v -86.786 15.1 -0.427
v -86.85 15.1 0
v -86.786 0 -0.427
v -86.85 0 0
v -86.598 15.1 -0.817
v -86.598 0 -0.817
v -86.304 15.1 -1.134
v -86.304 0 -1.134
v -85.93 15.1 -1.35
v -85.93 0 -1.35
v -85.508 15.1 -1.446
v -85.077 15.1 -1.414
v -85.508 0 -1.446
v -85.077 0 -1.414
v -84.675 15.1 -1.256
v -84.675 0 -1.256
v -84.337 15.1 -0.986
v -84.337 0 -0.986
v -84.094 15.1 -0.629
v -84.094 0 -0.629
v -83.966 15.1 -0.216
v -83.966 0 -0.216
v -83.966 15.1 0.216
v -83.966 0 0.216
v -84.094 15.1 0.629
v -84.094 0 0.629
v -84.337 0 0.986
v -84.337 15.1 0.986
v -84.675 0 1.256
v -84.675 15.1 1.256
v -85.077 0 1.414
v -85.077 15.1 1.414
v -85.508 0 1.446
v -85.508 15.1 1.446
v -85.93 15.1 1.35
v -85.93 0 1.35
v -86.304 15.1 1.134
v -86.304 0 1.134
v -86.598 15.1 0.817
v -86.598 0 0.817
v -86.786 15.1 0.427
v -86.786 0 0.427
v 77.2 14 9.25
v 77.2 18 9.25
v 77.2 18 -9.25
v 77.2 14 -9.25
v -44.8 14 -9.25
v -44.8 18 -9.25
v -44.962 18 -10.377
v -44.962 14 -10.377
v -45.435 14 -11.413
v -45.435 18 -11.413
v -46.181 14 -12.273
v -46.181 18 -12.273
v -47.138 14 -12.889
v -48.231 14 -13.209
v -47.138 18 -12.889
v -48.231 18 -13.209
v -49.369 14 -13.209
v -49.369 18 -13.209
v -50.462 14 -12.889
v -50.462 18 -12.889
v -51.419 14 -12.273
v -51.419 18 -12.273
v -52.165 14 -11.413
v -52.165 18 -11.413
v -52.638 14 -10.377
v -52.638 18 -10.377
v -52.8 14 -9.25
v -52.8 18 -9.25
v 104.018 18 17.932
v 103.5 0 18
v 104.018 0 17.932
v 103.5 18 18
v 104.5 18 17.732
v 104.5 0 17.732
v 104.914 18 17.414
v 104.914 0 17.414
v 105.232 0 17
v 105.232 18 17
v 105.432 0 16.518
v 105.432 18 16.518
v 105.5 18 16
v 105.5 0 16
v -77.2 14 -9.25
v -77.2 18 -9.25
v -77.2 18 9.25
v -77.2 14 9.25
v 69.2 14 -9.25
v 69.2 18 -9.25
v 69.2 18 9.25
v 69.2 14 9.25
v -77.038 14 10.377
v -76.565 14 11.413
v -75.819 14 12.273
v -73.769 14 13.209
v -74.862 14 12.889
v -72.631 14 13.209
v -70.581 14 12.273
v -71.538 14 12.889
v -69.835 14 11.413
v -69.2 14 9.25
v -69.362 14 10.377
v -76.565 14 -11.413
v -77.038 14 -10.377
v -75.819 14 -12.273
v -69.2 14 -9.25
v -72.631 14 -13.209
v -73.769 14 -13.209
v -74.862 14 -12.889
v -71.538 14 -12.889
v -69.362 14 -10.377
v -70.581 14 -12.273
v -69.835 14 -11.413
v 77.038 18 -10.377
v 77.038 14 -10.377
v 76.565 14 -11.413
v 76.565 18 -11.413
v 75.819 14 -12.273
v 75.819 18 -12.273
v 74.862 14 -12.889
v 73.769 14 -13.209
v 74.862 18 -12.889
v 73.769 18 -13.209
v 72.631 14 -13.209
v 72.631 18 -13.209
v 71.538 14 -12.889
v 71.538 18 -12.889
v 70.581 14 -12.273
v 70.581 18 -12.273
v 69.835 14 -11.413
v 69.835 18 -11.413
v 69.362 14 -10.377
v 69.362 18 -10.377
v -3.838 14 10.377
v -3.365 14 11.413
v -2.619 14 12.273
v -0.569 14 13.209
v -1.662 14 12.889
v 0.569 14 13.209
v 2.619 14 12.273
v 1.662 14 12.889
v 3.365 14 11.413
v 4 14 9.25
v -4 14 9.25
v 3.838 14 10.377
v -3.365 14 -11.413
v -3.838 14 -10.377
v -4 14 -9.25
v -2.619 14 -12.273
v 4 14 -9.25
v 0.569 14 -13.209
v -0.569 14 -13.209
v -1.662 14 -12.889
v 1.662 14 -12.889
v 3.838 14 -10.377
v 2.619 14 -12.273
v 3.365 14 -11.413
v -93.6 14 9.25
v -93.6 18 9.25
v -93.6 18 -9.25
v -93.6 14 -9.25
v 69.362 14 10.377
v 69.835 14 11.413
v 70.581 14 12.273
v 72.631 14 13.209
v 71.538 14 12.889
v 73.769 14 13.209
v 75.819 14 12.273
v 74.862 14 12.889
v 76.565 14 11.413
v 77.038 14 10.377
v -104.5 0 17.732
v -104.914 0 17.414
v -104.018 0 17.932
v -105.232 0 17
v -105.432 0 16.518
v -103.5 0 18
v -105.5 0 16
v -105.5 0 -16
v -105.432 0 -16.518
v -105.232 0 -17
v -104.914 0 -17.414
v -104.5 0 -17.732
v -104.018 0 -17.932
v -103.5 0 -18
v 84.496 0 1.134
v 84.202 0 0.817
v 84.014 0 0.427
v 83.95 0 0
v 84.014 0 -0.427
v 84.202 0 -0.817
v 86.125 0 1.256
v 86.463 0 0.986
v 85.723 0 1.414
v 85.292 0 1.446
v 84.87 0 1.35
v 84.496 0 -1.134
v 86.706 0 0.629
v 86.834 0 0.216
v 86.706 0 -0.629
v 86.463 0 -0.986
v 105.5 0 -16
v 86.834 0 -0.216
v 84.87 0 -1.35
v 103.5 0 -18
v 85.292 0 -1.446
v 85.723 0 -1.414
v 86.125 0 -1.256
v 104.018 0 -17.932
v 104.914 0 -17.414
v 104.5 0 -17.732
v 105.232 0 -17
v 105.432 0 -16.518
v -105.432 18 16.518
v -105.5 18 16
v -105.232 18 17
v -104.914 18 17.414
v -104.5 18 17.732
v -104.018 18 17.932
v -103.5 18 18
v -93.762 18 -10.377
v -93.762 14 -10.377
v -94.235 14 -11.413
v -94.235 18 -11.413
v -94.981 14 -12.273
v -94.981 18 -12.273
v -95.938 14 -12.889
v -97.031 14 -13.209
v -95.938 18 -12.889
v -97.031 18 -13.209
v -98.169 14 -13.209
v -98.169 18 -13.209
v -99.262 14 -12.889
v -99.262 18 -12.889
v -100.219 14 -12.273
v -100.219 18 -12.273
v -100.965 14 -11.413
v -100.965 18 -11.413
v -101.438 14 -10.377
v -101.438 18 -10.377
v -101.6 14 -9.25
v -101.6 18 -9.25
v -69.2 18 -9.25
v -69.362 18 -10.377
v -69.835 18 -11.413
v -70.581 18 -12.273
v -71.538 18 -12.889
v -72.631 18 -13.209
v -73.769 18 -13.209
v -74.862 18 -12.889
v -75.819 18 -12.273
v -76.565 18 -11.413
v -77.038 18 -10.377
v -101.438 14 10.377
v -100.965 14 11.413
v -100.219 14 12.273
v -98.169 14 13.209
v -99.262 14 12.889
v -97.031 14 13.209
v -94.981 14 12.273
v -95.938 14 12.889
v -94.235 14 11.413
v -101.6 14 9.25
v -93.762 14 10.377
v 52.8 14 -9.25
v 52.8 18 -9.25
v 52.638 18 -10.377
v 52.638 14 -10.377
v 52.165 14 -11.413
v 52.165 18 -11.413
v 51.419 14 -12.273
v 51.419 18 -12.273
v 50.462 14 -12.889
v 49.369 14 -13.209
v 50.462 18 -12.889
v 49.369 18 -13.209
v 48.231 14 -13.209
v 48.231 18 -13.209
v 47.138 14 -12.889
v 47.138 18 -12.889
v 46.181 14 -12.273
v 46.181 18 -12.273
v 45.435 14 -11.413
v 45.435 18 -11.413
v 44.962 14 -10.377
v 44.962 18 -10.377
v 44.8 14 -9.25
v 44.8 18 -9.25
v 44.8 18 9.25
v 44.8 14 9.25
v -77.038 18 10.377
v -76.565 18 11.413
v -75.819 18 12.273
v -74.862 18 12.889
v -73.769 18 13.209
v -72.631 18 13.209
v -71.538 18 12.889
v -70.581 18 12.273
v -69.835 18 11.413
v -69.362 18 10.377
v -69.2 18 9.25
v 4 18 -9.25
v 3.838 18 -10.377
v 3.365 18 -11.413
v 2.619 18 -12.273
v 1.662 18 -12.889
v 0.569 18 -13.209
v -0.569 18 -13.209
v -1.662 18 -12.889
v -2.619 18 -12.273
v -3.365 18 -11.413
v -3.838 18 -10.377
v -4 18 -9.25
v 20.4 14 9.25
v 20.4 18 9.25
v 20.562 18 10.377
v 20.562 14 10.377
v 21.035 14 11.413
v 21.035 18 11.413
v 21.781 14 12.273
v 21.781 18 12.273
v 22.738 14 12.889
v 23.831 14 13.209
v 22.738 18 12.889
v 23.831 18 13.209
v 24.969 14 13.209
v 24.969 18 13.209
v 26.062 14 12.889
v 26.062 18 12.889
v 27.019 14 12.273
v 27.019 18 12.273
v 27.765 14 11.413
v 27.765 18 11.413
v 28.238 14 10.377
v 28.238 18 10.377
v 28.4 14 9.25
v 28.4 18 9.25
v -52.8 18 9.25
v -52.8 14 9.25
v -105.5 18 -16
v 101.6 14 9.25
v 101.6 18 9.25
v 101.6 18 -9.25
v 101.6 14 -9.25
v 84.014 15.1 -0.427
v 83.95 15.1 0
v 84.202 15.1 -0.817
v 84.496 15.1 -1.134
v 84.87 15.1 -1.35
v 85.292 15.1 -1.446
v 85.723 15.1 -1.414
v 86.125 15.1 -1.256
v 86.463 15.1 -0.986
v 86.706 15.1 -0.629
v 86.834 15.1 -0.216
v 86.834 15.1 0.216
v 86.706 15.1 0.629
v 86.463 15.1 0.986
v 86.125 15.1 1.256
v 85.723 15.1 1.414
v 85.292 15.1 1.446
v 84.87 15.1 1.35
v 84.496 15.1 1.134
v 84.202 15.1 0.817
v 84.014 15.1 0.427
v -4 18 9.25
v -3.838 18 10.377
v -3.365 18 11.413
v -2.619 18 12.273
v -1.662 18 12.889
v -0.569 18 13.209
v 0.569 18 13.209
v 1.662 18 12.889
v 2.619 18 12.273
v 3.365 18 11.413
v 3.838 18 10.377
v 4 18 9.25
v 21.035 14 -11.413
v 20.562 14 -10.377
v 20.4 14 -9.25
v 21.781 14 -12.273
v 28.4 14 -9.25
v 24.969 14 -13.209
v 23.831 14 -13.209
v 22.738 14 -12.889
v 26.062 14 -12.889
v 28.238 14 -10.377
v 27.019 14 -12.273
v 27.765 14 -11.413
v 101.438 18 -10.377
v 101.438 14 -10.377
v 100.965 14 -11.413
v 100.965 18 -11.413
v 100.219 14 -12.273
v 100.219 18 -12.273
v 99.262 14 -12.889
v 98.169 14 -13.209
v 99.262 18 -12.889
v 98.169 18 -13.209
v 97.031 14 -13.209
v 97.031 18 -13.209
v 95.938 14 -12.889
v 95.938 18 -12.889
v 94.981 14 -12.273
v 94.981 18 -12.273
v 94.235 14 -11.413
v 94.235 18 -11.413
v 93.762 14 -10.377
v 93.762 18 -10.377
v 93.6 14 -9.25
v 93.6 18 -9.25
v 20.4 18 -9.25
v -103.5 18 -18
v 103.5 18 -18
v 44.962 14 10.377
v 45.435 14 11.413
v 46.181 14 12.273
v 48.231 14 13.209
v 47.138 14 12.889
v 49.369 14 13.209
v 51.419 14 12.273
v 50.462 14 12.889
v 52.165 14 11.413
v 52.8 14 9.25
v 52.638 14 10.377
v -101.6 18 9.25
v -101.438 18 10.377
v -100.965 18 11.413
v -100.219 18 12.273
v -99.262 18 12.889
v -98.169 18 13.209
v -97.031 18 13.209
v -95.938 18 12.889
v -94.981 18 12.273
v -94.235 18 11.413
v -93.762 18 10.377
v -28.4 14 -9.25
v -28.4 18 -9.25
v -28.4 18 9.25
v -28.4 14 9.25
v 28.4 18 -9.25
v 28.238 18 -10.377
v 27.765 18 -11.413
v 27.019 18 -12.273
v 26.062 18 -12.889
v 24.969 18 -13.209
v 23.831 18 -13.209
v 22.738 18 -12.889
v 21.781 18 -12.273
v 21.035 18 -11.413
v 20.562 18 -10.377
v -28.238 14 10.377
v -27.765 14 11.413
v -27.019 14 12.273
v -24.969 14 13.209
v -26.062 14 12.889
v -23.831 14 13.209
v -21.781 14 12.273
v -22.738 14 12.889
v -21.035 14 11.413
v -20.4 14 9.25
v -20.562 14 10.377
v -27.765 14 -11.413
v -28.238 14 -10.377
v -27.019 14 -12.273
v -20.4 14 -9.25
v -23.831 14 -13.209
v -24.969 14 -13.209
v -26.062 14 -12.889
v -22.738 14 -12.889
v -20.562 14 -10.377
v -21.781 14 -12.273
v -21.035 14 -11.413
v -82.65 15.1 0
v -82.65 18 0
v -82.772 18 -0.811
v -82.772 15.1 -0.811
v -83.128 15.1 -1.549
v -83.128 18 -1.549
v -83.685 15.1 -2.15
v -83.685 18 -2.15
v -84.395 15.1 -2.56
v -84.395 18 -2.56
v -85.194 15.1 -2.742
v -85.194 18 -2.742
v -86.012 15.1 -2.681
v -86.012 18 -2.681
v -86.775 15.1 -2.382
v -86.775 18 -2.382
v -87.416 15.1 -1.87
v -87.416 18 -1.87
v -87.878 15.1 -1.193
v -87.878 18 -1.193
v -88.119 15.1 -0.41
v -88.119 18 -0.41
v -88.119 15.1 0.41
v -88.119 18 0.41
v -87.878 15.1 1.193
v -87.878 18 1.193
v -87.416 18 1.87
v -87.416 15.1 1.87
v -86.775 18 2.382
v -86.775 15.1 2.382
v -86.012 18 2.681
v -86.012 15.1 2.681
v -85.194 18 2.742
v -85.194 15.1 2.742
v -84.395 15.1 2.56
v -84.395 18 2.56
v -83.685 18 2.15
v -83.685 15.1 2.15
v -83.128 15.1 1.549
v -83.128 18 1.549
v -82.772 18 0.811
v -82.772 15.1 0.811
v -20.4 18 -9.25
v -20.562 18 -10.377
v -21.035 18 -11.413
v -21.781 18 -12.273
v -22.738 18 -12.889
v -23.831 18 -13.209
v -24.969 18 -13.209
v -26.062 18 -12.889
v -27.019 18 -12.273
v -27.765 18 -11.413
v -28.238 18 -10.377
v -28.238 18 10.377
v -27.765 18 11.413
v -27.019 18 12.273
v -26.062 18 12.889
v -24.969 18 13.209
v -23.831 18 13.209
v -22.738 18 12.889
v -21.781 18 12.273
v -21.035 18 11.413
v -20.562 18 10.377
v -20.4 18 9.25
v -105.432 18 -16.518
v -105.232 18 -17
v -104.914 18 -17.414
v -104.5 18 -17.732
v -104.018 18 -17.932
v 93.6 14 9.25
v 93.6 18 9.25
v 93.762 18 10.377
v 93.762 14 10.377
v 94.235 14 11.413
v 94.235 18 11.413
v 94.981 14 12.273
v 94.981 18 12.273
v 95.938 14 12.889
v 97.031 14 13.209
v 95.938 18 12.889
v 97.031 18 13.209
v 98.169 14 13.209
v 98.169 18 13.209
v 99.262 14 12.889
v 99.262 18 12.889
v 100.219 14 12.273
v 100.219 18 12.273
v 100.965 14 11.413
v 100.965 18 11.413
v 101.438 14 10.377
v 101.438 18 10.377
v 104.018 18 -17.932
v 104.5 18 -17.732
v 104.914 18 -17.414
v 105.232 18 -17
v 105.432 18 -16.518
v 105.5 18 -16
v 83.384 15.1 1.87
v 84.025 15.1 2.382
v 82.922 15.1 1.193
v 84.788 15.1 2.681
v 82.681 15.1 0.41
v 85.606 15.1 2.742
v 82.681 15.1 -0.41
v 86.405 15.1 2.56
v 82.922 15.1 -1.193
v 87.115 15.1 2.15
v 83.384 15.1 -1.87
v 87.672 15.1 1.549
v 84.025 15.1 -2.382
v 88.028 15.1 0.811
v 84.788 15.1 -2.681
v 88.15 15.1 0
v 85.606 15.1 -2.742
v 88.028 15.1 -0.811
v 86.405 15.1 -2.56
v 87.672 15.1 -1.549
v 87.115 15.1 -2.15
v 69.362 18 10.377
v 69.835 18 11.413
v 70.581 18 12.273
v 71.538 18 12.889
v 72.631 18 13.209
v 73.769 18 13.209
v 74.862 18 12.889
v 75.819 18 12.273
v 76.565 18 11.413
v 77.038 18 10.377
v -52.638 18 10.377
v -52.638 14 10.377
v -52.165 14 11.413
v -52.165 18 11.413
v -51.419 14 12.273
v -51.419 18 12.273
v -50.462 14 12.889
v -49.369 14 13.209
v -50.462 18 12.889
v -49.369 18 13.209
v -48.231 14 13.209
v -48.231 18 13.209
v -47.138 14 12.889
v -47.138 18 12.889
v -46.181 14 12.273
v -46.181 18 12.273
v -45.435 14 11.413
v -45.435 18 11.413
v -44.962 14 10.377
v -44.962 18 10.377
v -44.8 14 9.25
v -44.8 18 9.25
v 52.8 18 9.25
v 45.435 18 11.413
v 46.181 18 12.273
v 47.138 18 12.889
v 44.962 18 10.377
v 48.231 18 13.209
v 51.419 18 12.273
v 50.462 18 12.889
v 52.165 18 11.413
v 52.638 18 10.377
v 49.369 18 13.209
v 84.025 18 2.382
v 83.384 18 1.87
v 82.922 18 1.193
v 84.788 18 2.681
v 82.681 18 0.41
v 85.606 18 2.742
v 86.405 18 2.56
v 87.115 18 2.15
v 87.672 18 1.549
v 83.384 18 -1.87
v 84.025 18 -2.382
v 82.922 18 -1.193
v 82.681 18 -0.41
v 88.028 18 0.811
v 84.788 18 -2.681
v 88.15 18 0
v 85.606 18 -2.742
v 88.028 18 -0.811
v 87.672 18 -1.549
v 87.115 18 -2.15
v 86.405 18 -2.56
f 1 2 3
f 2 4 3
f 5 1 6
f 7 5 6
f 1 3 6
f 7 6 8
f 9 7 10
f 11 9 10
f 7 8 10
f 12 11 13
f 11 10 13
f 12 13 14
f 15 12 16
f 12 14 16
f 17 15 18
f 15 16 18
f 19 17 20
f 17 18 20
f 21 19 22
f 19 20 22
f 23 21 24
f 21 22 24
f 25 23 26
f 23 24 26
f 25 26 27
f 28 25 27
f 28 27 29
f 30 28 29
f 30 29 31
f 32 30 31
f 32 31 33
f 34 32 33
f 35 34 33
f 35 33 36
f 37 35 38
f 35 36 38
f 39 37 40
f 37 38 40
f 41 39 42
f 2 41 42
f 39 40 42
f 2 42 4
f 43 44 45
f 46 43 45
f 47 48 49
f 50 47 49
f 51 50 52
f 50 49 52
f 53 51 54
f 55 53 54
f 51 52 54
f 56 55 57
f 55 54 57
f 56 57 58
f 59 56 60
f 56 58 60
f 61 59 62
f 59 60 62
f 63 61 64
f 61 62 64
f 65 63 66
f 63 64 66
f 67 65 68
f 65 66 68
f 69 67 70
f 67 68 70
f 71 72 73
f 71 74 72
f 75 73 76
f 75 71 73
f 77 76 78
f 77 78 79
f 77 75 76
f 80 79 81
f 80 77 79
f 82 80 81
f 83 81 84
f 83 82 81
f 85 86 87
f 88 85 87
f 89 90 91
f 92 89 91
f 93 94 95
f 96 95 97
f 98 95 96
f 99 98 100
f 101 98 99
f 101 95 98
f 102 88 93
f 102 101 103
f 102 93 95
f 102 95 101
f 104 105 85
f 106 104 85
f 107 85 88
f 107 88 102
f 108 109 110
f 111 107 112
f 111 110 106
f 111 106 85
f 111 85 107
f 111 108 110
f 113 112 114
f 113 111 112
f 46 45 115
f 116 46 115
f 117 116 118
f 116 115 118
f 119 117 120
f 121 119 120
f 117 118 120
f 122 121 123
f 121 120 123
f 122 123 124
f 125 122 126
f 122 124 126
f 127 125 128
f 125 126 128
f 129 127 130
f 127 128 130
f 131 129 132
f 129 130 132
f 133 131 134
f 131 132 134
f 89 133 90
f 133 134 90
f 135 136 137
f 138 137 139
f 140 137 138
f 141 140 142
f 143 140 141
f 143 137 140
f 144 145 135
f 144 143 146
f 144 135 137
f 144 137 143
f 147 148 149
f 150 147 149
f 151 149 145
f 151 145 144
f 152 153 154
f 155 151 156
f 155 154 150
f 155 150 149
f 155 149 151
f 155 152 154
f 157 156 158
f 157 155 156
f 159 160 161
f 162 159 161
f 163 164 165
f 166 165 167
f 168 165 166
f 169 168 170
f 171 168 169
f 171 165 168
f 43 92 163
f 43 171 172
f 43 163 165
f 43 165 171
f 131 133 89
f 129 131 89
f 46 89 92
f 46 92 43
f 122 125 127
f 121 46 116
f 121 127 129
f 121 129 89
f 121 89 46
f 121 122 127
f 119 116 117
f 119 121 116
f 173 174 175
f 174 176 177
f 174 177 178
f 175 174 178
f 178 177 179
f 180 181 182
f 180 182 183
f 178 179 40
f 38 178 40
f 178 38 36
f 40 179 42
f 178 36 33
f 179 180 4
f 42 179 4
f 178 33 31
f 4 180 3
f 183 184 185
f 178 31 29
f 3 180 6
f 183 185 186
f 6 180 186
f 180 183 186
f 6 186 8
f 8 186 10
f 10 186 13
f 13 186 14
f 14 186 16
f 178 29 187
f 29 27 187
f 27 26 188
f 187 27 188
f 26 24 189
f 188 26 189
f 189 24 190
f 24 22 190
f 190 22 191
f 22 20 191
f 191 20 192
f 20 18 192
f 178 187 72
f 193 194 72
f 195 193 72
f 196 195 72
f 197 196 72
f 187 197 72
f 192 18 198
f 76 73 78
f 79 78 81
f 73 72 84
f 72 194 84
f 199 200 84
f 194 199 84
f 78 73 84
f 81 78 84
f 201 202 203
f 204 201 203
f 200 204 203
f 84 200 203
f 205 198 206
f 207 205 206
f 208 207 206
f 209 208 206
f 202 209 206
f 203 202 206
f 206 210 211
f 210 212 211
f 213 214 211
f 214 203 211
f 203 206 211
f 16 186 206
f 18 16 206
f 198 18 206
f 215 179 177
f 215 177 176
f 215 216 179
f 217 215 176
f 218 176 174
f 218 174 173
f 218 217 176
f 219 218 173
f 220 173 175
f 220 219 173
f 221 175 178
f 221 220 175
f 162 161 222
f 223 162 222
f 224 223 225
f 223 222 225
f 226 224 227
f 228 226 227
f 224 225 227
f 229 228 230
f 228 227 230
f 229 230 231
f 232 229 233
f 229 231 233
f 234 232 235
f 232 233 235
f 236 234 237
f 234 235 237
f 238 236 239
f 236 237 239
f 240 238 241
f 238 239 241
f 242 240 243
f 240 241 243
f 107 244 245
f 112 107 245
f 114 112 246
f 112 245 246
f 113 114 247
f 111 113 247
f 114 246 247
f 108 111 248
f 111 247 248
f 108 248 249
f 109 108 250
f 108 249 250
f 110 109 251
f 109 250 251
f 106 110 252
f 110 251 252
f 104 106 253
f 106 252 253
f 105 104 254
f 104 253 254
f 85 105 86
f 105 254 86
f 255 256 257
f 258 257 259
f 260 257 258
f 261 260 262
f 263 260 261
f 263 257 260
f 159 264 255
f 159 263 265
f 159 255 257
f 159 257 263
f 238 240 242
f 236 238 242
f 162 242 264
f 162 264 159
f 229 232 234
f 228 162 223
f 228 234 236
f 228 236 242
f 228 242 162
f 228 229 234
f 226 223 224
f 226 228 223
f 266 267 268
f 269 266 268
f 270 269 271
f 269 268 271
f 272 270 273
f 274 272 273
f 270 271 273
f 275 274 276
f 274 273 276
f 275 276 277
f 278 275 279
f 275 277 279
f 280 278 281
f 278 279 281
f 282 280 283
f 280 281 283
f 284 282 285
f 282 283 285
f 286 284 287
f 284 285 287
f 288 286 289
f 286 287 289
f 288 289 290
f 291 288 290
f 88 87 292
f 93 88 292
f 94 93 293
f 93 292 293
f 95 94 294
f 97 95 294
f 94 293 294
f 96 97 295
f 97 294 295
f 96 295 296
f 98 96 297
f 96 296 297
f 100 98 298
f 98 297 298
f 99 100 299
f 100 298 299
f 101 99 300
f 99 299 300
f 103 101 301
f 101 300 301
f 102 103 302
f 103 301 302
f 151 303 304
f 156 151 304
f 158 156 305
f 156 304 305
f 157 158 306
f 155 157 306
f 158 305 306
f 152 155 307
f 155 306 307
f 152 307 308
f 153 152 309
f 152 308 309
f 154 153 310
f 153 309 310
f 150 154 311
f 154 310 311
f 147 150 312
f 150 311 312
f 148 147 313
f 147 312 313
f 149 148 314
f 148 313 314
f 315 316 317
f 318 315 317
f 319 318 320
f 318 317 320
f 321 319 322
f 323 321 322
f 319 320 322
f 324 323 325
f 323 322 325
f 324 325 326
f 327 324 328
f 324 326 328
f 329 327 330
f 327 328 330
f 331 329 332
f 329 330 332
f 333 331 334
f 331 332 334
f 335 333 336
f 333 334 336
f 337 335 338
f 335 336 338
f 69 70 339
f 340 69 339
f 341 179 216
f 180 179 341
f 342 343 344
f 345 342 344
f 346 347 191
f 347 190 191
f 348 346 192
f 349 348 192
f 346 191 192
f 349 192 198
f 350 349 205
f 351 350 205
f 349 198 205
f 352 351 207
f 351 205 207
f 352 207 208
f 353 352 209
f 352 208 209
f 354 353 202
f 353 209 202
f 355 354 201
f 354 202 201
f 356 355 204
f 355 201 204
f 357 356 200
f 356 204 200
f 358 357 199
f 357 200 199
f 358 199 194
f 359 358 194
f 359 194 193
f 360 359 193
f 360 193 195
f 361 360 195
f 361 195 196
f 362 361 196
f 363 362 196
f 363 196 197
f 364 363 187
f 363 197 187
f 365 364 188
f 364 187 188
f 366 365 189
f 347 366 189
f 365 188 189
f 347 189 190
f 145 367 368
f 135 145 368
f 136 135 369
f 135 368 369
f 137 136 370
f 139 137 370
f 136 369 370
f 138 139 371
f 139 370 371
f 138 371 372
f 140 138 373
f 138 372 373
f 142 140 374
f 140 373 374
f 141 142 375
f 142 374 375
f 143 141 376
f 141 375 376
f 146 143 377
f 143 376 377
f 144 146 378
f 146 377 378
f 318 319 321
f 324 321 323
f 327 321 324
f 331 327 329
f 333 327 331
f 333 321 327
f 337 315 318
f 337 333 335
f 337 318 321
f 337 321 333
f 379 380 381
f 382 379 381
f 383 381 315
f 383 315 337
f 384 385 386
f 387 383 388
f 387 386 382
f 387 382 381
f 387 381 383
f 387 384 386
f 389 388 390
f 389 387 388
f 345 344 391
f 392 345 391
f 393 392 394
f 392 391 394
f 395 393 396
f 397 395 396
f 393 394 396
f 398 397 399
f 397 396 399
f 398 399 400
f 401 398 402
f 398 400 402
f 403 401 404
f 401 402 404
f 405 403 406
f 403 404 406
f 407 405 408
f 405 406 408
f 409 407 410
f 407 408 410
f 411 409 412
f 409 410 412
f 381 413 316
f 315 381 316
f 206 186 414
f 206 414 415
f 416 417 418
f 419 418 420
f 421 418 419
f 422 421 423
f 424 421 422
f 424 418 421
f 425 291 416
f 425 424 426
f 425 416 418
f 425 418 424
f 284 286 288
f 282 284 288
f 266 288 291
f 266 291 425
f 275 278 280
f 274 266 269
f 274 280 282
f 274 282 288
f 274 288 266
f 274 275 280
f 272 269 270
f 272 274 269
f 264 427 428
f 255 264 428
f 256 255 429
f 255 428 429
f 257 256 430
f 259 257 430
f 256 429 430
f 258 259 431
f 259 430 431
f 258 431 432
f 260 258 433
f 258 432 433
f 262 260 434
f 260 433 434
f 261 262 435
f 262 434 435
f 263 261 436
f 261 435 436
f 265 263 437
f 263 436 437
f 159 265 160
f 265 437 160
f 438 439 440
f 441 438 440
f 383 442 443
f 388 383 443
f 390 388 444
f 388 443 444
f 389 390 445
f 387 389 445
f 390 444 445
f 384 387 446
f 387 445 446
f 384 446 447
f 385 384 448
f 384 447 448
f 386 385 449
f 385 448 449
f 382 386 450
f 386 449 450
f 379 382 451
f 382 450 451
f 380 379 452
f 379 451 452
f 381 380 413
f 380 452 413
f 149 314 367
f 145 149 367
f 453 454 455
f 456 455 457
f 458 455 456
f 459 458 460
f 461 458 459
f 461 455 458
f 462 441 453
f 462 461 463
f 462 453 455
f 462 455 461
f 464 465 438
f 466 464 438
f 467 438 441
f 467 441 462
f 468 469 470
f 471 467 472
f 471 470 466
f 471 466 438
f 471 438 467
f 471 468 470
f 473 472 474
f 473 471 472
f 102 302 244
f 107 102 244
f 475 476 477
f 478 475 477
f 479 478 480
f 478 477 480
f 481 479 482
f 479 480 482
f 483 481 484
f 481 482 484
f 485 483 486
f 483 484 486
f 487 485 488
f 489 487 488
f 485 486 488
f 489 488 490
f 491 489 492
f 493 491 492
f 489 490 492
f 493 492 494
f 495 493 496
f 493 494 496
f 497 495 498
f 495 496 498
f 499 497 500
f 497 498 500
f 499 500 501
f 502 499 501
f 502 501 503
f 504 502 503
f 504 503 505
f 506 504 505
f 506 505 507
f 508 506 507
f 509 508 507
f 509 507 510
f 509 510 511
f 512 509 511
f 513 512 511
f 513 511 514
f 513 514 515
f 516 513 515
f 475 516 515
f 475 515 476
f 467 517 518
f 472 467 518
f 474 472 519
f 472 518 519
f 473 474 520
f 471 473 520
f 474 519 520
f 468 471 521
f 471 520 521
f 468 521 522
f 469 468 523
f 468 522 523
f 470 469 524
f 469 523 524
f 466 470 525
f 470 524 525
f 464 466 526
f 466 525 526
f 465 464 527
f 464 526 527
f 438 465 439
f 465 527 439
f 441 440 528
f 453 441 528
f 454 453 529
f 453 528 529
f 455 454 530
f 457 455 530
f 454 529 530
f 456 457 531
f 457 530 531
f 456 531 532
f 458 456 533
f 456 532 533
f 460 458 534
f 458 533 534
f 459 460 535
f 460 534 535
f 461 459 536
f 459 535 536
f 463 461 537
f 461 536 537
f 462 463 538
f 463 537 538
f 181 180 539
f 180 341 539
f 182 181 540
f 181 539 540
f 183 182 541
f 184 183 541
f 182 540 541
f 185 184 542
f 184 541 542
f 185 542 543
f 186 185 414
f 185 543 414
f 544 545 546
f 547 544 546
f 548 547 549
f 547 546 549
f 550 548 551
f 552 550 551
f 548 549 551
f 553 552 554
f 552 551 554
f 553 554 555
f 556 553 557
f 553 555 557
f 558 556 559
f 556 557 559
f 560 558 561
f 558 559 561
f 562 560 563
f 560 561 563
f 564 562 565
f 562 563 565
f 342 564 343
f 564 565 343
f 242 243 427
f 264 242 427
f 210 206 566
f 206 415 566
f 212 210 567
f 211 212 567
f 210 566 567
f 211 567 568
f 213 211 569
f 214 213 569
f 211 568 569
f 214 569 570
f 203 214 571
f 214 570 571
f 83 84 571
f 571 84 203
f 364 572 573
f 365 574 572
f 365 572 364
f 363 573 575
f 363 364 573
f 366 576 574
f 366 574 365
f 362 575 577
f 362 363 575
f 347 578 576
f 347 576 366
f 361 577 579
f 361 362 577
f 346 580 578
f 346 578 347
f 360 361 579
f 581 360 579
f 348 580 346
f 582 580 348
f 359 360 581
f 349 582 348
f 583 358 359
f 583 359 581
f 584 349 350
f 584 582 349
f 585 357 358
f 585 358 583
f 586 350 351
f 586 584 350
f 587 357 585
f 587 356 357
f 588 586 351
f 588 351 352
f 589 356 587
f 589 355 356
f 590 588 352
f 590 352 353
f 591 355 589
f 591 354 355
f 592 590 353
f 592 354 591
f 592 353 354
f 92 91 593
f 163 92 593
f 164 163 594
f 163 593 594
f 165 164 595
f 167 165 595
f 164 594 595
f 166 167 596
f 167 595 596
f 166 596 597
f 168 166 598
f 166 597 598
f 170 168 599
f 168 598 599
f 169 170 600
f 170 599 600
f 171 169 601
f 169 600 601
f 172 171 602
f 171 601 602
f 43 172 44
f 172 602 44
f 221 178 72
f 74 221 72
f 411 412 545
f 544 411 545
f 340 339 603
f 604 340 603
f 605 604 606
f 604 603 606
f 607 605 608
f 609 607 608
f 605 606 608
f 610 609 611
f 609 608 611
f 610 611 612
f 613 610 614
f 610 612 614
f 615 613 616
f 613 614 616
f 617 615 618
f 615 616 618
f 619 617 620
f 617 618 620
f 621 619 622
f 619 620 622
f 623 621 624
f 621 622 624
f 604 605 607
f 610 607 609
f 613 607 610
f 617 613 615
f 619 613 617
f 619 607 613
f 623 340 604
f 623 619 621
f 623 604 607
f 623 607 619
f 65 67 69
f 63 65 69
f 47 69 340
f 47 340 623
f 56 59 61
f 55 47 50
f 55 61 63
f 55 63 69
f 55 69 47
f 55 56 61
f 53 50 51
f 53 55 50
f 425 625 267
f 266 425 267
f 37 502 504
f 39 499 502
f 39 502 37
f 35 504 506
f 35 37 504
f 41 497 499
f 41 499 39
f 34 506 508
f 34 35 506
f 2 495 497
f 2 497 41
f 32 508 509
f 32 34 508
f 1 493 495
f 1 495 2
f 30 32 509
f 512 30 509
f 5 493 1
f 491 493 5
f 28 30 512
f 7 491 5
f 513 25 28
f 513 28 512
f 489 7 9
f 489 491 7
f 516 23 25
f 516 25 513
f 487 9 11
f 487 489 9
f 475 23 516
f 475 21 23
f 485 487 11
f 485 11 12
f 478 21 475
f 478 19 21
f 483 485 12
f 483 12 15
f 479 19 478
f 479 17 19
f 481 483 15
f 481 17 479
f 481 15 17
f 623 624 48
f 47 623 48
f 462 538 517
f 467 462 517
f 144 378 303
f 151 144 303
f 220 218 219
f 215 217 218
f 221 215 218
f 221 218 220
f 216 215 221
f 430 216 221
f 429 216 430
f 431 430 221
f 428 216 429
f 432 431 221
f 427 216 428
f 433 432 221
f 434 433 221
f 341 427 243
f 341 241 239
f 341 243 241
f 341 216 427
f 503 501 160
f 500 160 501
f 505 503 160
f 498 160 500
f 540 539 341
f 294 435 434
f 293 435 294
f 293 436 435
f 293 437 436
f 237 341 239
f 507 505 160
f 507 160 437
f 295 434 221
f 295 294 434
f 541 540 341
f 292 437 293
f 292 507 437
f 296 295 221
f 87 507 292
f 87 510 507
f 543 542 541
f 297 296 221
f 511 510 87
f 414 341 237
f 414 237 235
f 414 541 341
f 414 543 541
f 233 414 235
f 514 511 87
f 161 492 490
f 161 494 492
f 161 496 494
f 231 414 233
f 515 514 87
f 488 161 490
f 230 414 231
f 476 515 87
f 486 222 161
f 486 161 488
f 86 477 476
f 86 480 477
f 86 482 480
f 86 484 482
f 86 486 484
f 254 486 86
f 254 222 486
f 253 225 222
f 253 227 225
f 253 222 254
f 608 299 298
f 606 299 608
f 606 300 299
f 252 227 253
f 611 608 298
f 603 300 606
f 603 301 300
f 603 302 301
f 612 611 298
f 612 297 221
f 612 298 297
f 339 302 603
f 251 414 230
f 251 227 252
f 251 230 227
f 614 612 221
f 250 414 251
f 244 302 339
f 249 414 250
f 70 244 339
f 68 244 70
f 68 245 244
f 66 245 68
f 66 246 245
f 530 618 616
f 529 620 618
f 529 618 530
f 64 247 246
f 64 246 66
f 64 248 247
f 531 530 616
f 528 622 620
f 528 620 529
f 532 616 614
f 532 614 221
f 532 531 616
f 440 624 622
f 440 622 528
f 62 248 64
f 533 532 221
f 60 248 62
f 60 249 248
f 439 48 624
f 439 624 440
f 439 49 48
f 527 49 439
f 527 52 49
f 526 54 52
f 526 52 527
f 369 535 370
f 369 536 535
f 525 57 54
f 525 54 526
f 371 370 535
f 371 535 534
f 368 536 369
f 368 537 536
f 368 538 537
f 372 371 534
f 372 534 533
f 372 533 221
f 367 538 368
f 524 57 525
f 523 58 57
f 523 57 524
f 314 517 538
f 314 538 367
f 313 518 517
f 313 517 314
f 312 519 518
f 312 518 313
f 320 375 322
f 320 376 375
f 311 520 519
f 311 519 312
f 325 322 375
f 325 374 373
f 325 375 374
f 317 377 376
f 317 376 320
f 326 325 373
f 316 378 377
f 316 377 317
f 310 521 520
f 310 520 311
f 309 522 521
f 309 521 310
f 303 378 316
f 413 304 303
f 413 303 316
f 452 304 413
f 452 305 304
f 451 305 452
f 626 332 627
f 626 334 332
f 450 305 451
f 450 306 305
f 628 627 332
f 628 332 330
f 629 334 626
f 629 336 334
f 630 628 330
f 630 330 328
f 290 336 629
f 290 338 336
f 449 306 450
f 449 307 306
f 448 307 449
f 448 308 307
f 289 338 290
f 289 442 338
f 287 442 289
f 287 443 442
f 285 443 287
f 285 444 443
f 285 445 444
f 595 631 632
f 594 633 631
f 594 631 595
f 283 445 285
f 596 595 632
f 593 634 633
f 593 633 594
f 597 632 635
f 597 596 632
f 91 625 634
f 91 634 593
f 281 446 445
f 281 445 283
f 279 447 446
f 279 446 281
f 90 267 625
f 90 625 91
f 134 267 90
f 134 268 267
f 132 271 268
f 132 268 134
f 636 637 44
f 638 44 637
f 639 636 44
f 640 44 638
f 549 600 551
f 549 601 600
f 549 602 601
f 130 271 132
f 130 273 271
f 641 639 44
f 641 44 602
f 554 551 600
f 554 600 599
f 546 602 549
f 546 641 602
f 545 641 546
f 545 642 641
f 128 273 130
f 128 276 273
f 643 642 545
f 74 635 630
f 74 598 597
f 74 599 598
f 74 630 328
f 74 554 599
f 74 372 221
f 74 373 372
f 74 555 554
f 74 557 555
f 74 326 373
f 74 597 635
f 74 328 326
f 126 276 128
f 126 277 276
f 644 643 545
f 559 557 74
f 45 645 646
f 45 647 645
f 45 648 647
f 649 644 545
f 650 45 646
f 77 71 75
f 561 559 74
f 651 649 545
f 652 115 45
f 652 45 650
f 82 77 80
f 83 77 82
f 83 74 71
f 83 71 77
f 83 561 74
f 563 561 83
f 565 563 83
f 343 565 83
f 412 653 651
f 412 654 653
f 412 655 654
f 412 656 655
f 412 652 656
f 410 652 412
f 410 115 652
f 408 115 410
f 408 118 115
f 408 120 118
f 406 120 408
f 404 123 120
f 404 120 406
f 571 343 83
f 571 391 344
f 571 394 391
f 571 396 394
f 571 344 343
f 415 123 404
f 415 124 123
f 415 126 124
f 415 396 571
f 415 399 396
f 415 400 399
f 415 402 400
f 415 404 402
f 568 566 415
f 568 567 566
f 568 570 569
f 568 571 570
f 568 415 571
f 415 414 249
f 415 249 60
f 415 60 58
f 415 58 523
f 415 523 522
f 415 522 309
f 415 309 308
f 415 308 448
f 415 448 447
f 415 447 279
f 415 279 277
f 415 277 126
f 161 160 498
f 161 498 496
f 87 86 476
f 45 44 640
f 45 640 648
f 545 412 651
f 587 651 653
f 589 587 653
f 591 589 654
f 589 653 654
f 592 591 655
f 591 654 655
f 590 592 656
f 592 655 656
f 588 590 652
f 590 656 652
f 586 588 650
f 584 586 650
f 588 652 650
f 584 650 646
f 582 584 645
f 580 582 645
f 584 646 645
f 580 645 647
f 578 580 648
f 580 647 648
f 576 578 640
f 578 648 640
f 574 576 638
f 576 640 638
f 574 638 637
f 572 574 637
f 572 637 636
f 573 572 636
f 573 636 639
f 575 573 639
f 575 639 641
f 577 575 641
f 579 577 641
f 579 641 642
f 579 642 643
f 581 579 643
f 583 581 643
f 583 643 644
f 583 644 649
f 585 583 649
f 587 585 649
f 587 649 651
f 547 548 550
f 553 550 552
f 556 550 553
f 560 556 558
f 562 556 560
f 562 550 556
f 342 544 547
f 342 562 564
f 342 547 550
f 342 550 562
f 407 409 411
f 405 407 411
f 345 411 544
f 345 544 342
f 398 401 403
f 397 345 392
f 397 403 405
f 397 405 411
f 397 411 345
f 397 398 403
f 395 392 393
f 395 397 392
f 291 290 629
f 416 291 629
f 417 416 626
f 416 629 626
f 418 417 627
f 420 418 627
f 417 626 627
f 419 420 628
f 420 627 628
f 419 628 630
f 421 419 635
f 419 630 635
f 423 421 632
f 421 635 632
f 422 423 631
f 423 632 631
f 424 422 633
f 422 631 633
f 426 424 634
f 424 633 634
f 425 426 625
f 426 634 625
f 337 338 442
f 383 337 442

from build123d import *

# Parameters (mm, degrees)
SKETCH1_W                                         = 211
SKETCH1_H                                         = 36
BOSS_EXTRUDE1_DEPTH                               = 18
CUT_EXTRUDE1_DEPTH                                = 4
LPATTERN1_COUNT                                   = 9
LPATTERN1_PITCH                                   = 24.4
CBORE_FOR_M2_5_SOCKET_HEAD_CAP_SCREW1_D           = 2.9
CBORE_FOR_M2_5_SOCKET_HEAD_CAP_SCREW1_CBORE_D     = 5.5
CBORE_FOR_M2_5_SOCKET_HEAD_CAP_SCREW1_CBORE_DEPTH = 2.9
FILLET1_R                                         = 2


with BuildPart() as part:
    # Sketch1 → Boss-Extrude1 (new body)
    with BuildSketch(Plane(origin=(0, 0, 0), x_dir=(1, 0, 0), z_dir=(0, 1, 0))):
        Rectangle(SKETCH1_W, SKETCH1_H)
    extrude(amount=BOSS_EXTRUDE1_DEPTH)

    # Sketch2 → Cut-Extrude1 (cut)
    with BuildSketch(Plane(origin=(0, 18, 0), x_dir=(1, 0, 0), z_dir=(0, 1, 0))):
        with BuildLine():
            Line((-101.6, 9.25), (-101.6, -9.25))
            ThreePointArc((-101.6, -9.25), (-97.6, -13.25), (-93.6, -9.25))
            Line((-93.6, -9.25), (-93.6, 9.25))
            ThreePointArc((-93.6, 9.25), (-97.6, 13.25), (-101.6, 9.25))
        make_face()
    cut_extrude1 = extrude(amount=-CUT_EXTRUDE1_DEPTH, mode=Mode.SUBTRACT)

    # LPattern1: Cut-Extrude1 ×9
    with Locations(*[(i * LPATTERN1_PITCH, 0, 0) for i in range(1, LPATTERN1_COUNT)]):
        add(cut_extrude1, mode=Mode.SUBTRACT)

    # CBORE for M2.5 Socket Head Cap Screw1 (through all)
    with Locations(Plane(origin=(0, 18, 0), x_dir=(1, 0, 0), z_dir=(0, 1, 0))):
        with Locations((-85.4, 0), (85.4, 0)):
            CounterBoreHole(CBORE_FOR_M2_5_SOCKET_HEAD_CAP_SCREW1_D / 2, CBORE_FOR_M2_5_SOCKET_HEAD_CAP_SCREW1_CBORE_D / 2, CBORE_FOR_M2_5_SOCKET_HEAD_CAP_SCREW1_CBORE_DEPTH)

    # Fillet1
    fillet1_edges = [part.edges().sort_by_distance(p)[0] for p in [
        (105.5, 9, 18),
        (-105.5, 9, 18),
        (-105.5, 9, -18),
        (105.5, 9, -18),
    ]]
    fillet(fillet1_edges, radius=FILLET1_R)


solid = part.part
